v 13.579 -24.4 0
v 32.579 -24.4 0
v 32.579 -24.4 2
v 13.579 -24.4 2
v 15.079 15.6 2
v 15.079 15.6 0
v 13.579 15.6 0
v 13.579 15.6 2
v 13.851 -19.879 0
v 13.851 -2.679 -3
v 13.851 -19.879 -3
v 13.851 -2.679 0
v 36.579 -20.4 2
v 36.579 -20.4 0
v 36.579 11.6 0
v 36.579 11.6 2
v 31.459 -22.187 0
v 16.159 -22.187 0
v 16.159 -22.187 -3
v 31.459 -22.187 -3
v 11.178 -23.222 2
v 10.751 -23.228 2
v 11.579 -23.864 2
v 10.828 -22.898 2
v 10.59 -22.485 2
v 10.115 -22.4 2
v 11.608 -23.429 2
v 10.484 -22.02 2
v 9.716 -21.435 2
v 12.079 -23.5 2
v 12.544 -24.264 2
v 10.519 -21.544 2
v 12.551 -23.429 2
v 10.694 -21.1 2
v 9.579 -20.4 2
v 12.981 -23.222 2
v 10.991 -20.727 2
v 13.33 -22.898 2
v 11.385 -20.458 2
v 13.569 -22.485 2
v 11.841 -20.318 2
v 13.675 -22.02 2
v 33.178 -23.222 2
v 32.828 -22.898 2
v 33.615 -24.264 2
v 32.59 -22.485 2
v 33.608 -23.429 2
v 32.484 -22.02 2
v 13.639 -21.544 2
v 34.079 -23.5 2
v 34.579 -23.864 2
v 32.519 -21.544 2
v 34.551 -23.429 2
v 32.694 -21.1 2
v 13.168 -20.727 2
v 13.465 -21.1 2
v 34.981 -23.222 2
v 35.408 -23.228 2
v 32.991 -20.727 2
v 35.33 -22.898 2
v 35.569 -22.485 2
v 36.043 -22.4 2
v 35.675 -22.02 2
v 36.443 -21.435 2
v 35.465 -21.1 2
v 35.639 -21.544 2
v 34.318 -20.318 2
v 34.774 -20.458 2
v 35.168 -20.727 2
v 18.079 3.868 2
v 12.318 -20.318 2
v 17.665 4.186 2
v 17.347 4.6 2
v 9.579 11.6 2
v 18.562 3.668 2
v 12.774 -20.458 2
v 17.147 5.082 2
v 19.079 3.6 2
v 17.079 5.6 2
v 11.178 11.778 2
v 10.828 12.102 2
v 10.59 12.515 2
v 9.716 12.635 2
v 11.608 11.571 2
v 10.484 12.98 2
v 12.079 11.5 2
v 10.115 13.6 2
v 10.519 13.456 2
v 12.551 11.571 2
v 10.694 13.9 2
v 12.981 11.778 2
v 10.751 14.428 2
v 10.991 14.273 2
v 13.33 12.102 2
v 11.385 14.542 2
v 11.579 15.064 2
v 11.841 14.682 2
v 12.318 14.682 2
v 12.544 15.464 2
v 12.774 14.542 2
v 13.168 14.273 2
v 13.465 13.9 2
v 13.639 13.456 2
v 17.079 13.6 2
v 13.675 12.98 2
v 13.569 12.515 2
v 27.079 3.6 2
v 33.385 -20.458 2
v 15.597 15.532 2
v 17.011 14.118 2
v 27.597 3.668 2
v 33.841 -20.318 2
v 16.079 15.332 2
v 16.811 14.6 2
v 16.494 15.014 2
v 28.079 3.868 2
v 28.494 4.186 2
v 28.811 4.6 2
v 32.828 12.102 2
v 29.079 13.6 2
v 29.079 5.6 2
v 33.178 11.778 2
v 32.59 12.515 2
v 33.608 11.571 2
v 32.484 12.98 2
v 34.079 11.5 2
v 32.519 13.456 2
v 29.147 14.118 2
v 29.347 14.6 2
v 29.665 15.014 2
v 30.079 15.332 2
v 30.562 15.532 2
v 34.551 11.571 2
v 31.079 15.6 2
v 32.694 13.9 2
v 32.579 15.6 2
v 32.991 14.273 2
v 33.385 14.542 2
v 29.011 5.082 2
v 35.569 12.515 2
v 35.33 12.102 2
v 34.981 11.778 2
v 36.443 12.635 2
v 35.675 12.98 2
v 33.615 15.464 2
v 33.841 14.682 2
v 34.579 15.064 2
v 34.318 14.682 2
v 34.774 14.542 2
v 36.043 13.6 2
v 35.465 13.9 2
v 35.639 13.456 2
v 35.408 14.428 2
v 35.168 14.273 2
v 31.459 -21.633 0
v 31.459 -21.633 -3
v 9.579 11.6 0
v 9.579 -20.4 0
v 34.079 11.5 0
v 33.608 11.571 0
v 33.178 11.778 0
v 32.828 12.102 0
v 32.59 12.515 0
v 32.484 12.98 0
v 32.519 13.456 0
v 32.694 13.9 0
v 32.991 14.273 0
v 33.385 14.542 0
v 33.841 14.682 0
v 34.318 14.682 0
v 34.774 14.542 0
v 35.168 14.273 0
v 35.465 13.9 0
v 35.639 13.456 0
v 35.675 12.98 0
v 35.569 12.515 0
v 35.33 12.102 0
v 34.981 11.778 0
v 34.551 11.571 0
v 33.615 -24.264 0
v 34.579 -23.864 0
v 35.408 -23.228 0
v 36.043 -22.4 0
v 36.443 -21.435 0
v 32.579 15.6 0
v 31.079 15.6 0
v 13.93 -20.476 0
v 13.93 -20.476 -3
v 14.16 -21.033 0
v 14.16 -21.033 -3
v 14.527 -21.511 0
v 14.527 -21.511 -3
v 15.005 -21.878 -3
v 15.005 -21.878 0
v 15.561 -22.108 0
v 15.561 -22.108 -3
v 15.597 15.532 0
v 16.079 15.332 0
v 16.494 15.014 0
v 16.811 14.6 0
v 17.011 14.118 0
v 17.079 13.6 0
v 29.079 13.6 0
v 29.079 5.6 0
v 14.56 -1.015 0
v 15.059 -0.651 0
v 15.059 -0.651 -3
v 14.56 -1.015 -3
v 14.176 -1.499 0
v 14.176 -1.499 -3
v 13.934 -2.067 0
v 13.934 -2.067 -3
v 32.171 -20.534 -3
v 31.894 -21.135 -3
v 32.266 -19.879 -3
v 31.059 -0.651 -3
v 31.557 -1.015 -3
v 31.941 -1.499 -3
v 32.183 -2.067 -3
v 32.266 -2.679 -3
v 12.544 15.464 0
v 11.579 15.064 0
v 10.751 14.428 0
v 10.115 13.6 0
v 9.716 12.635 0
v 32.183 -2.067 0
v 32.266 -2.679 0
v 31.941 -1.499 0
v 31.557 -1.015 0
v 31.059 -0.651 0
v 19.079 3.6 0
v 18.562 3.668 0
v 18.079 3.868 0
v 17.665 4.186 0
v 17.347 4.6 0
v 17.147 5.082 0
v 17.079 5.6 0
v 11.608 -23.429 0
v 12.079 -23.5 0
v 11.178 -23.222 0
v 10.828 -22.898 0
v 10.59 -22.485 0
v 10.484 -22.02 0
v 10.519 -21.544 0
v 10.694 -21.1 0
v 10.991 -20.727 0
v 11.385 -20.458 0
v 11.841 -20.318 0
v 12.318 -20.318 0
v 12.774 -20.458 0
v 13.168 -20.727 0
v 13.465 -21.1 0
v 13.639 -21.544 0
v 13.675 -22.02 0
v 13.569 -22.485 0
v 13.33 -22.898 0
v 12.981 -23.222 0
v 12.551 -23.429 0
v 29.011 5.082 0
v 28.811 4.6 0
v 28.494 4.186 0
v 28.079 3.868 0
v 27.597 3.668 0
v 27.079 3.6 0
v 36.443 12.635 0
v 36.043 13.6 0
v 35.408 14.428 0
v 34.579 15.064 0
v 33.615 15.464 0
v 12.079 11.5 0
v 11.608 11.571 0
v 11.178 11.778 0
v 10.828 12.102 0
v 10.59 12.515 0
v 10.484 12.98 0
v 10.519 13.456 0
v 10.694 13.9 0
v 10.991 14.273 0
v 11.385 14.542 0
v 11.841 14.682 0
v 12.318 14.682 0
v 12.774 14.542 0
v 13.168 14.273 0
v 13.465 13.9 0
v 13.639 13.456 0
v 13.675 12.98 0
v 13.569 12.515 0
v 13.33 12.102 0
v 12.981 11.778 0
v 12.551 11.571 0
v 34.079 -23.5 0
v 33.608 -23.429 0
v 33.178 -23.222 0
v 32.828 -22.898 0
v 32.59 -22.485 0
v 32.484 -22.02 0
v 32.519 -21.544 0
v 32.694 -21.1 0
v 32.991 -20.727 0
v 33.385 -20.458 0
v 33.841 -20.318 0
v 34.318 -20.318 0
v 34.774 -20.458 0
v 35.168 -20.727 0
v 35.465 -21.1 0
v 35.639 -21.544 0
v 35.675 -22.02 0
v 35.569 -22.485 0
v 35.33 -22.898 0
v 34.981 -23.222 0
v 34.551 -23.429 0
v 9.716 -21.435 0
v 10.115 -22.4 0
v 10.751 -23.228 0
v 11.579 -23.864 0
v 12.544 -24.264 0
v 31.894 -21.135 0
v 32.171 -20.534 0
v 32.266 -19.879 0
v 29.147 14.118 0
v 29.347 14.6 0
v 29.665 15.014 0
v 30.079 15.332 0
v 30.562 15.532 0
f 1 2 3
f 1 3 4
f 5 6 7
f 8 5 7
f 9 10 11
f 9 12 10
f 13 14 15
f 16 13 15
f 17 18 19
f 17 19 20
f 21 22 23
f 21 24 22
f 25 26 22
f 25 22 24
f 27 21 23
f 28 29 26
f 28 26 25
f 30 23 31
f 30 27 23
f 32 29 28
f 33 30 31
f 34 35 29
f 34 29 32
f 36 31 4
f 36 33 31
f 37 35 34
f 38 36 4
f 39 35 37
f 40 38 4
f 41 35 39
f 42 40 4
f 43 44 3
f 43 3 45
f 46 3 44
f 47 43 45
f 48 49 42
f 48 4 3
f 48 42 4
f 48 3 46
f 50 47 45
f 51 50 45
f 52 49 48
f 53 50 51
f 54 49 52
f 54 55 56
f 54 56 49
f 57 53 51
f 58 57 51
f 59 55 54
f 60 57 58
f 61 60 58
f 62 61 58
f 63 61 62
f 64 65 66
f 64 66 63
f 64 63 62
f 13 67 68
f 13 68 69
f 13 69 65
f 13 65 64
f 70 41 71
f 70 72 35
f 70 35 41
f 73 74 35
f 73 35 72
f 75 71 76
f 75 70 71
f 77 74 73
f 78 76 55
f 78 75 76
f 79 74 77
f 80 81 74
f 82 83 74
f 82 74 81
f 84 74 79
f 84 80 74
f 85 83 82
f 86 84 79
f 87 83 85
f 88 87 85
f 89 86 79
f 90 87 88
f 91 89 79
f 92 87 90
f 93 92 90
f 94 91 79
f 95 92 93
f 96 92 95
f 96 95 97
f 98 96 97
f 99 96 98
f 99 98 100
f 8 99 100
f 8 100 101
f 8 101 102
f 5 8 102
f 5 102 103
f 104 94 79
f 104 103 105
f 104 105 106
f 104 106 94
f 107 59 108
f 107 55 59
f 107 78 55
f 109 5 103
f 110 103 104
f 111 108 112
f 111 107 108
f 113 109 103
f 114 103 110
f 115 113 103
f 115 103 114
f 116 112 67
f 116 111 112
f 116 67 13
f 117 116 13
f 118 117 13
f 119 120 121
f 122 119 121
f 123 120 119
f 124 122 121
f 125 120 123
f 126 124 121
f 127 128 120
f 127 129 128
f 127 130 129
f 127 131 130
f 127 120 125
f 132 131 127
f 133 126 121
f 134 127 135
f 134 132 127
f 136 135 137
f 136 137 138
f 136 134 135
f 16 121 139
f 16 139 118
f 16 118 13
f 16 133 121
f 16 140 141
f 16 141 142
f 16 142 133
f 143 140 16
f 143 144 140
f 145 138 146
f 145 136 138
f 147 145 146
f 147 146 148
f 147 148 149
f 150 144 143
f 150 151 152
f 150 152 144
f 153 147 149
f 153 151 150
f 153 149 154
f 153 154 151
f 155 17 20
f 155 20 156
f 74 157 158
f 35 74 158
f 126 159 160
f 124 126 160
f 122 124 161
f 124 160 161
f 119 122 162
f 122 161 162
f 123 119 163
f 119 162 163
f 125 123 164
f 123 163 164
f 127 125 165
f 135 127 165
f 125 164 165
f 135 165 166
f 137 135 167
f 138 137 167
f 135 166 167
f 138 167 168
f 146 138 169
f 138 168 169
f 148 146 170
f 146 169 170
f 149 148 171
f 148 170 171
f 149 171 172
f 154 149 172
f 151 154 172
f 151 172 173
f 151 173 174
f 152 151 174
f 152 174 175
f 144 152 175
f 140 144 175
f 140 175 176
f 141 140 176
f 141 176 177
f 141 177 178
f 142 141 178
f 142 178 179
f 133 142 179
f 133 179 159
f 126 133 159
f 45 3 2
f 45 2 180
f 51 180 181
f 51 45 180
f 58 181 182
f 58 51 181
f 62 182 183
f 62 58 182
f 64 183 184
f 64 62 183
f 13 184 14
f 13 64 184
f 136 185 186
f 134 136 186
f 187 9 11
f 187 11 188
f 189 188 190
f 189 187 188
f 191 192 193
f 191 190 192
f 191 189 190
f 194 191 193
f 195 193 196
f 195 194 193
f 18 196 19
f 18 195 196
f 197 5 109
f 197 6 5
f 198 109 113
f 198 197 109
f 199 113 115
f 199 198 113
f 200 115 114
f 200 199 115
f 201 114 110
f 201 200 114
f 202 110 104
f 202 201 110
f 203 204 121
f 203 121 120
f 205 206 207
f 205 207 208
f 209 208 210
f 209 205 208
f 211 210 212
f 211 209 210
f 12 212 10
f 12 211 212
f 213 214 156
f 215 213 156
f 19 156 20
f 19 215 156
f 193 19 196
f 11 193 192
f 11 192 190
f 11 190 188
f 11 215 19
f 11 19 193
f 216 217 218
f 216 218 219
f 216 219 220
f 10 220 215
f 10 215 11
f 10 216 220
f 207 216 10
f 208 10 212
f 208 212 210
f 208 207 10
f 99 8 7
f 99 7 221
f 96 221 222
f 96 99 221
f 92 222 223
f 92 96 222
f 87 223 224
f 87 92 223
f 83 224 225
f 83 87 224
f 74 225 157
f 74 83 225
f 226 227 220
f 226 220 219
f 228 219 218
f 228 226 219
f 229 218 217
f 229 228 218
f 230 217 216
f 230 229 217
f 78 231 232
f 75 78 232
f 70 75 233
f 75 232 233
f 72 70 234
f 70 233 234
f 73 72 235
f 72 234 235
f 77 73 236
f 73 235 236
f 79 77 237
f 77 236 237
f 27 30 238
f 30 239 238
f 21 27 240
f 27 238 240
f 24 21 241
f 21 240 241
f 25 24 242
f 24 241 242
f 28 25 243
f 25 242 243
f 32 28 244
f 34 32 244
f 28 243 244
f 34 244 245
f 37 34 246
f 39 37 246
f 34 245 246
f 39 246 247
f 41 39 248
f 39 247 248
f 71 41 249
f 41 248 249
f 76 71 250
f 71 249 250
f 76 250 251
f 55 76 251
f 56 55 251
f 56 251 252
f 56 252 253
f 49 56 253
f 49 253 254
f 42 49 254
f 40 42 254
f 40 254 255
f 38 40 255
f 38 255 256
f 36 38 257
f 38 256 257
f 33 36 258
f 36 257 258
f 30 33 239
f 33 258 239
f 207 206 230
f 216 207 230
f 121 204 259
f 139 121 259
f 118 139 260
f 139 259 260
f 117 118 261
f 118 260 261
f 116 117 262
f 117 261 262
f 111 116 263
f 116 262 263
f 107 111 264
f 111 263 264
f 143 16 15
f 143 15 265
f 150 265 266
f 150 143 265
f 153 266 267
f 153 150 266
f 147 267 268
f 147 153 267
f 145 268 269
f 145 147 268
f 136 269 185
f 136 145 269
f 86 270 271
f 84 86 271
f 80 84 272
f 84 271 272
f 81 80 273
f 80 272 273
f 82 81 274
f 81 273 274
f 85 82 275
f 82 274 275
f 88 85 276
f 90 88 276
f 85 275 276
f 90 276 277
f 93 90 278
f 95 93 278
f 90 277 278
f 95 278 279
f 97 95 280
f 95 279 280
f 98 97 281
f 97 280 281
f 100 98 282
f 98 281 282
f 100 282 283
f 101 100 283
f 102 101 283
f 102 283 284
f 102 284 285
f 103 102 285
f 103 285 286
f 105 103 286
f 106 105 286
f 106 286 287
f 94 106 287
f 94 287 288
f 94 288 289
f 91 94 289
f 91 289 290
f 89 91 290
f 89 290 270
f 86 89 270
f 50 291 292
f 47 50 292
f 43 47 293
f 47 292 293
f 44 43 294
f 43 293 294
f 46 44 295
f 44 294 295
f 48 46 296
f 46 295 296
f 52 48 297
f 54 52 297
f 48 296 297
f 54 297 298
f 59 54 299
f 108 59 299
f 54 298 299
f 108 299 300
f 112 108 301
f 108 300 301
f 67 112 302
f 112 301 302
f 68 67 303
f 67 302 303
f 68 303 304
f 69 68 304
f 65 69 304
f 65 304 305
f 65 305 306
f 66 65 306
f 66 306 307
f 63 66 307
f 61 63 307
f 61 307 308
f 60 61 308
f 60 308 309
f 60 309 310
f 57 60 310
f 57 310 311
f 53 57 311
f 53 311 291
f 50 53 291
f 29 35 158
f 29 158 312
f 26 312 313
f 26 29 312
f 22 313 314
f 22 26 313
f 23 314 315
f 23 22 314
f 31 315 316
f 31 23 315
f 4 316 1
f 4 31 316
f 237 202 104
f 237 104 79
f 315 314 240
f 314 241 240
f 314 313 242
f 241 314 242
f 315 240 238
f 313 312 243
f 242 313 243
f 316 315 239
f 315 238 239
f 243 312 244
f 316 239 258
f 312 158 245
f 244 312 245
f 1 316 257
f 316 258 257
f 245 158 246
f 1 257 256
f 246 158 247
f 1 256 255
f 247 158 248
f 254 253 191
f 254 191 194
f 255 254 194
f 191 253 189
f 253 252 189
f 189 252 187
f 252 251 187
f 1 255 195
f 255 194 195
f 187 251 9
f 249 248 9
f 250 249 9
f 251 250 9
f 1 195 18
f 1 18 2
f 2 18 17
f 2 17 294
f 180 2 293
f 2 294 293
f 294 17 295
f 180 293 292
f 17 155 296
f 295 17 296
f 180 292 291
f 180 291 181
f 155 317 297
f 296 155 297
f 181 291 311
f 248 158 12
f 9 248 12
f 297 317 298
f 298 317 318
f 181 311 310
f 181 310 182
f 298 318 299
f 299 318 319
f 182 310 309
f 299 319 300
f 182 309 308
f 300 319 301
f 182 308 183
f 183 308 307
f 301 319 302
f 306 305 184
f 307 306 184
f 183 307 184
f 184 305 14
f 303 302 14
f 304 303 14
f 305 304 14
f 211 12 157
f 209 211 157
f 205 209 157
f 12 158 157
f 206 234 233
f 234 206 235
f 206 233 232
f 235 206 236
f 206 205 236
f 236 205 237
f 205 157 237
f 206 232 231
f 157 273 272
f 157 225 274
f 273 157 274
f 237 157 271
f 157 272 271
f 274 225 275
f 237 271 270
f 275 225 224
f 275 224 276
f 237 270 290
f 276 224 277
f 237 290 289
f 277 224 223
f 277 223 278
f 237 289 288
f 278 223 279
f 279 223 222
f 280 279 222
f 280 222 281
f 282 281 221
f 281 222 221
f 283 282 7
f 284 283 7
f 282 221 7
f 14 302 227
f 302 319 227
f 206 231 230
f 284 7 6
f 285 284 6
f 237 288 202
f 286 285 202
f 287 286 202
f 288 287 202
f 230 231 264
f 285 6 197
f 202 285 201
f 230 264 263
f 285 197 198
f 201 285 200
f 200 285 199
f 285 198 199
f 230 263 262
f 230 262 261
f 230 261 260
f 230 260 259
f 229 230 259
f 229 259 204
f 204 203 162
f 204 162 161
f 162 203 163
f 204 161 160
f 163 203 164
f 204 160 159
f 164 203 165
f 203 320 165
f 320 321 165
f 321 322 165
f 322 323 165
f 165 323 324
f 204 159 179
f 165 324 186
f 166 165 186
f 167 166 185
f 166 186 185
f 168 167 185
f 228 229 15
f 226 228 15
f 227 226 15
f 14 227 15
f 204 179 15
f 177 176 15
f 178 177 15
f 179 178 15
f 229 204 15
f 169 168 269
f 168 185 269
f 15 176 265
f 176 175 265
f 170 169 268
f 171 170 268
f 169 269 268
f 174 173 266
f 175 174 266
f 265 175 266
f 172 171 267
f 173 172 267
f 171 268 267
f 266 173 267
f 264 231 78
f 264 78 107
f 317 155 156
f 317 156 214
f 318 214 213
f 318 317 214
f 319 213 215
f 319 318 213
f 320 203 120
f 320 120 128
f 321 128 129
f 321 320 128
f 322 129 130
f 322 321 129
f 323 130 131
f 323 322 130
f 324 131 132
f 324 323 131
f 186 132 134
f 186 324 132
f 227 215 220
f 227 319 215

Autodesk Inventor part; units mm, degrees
ref_plane "YZ Plane" through (0, 0, 0) normal (1, 0, 0) x (0, 1, 0)
ref_plane "XZ Plane" through (0, 0, 0) normal (0, 1, 0) x (-1, 0, 0)
ref_plane "XY Plane" through (0, 0, 0) normal (0, 0, 1) x (1, 0, 0)
ref_plane "Arbeitsebene1" through (0, 0, 0) normal (0, 0, 1) x (1, 0, 0)
sketch "Skizze1" plane through (0, 0, 0) normal (0, 0, 1) x (1, 0, 0)
  line L0 (31.9586, -24.4) -> (31.9586, -21.8494) projected
  line L1 (31.9586, -24.4) -> (35.5793, -24.4) projected
  arc A0 (35.5793, -24.4) -> (36.5793, -23.4) centre (35.5793, -23.4) ccw projected
  line L2 (36.5793, -23.4) -> (36.5793, 14.6) projected
  arc A1 (36.5793, 14.6) -> (35.5793, 15.6) centre (35.5793, 14.6) ccw projected
  line L3 (35.5793, 15.6) -> (31.5586, 15.6) projected
  line L4 (31.5586, 15.6) -> (31.5586, -0.3724) projected
  arc A2 (32.766, -2.6793) -> (31.5586, -0.3724) centre (29.9586, -2.6793) ccw projected
  line L5 (32.766, -2.6793) -> (32.766, -19.8793) projected
  arc A3 (31.9586, -21.8494) -> (32.766, -19.8793) centre (29.9586, -19.8793) ccw projected
  line L6 (20.9586, -22.6867) -> (20.9586, -24.4) projected
  line L7 (20.9586, -22.6867) -> (16.1586, -22.6867) projected
  arc A4 (13.3512, -19.8793) -> (16.1586, -22.6867) centre (16.1586, -19.8793) ccw projected
  line L8 (13.3512, -19.8793) -> (13.3512, -2.6793) projected
  arc A5 (14.5586, -0.3724) -> (13.3512, -2.6793) centre (16.1586, -2.6793) ccw projected
  line L9 (14.5586, -0.3724) -> (14.5586, 15.6) projected
  line L10 (14.5586, 15.6) -> (10.5793, 15.6) projected
  arc A6 (10.5793, 15.6) -> (9.5793, 14.6) centre (10.5793, 14.6) ccw projected
  line L11 (9.5793, 14.6) -> (9.5793, -23.4) projected
  arc A7 (9.5793, -23.4) -> (10.5793, -24.4) centre (10.5793, -23.4) ccw projected
  line L12 (10.5793, -24.4) -> (20.9586, -24.4) projected
  circle A8 centre (12.0668, 4.4966) radius 1.4 projected
  line L13 (31.5586, 15.6) -> (14.5586, 15.6)
  line L14 (31.9586, -24.4) -> (20.9586, -24.4)
  line L15 (10.5793, 15.6) -> (9.5793, 15.6)
  line L16 (9.5793, 15.6) -> (9.5793, 14.6)
  line L17 (35.5793, 15.6) -> (36.5793, 15.6)
  line L18 (36.5793, 15.6) -> (36.5793, 14.6)
  line L19 (9.5793, -23.4) -> (9.5793, -24.4)
  line L20 (9.5793, -24.4) -> (10.5793, -24.4)
  line L21 (35.5793, -24.4) -> (36.5793, -24.4)
  line L22 (36.5793, -24.4) -> (36.5793, -23.4)
extrude "Extrusion1" add sketch "Skizze1" along normal blind 2 contours L14 L6 L7 A4 L8 A5 L9 L13 L4 A2 L5 A3 L0 | L0 A3 L5 A2 L4 L3 A1 L2 A0 L1 | A0 L22 L21 | L12 A7 L11 A6 L10 L9 A5 L8 A4 L7 L6 | L20 L19 A7 | A1 L17 L18 | L16 L15 A6 | A8
ref_plane "Arbeitsebene2" through (0, 0, 0) normal (0, 0, 1) x (1, 0, 0)
sketch "Skizze2" plane through (0, 0, 2) normal (0, 0, 1) x (1, 0, 0)
  arc A0 (35.5793, -24.4) -> (36.5793, -23.4) centre (35.5793, -23.4) ccw projected
  line L0 (36.5793, -23.4) -> (36.5793, 14.6) projected
  arc A1 (36.5793, 14.6) -> (35.5793, 15.6) centre (35.5793, 14.6) ccw projected
  line L1 (35.5793, 15.6) -> (10.5793, 15.6) projected
  arc A2 (10.5793, 15.6) -> (9.5793, 14.6) centre (10.5793, 14.6) ccw projected
  line L2 (9.5793, 14.6) -> (9.5793, -23.4) projected
  arc A3 (9.5793, -23.4) -> (10.5793, -24.4) centre (10.5793, -23.4) ccw projected
  line L3 (10.5793, -24.4) -> (35.5793, -24.4) projected
  line L4 (34.0793, 13.1) -> (34.0793, -21.9)
  line L5 (34.0793, -21.9) -> (12.0793, -21.9)
  line L6 (12.0793, -21.9) -> (12.0793, 13.1)
  line L7 (12.0793, 13.1) -> (34.0793, 13.1)
  point P0 (8.0712, 15)
  point P1 (8.0712, -15)
  point P2 (38.0712, 15)
  point P3 (38.0712, -15)
  dimension "d21" = 2.5
hole "Bohrung1" at (34.0793, 13.1, 2) at (34.0793, -21.9, 2) at (12.0793, -21.9, 2) at (12.0793, 13.1, 2) direction (0, 0, -1) diameter 3.2 end through all
sketch "Skizze4" plane through (0, 0, 0) normal (0, 0, -1) x (-1, 0, 0)
  circle A0 centre (-34.0793, 13.1) radius 1.4 projected
  circle A1 centre (-34.0793, -21.9) radius 1.4 projected
  line L0 (-31.9586, -24.4) -> (-31.9586, -21.8494) projected
  line L1 (-31.9586, -24.4) -> (-35.5793, -24.4) projected
  arc A2 (-36.5793, -23.4) -> (-35.5793, -24.4) centre (-35.5793, -23.4) ccw projected
  line L2 (-36.5793, -23.4) -> (-36.5793, 14.6) projected
  arc A3 (-35.5793, 15.6) -> (-36.5793, 14.6) centre (-35.5793, 14.6) ccw projected
  line L3 (-35.5793, 15.6) -> (-31.5586, 15.6) projected
  line L4 (-31.5586, 15.6) -> (-31.5586, -0.3724) projected
  arc A4 (-31.5586, -0.3724) -> (-32.766, -2.6793) centre (-29.9586, -2.6793) ccw projected
  line L5 (-32.766, -2.6793) -> (-32.766, -19.8793) projected
  arc A5 (-32.766, -19.8793) -> (-31.9586, -21.8494) centre (-29.9586, -19.8793) ccw projected
  circle A6 centre (-12.0793, -21.9) radius 1.4 projected
  circle A7 centre (-12.0793, 13.1) radius 1.4 projected
  line L6 (-20.9586, -22.6867) -> (-20.9586, -24.4) projected
  line L7 (-20.9586, -22.6867) -> (-16.1586, -22.6867) projected
  arc A8 (-16.1586, -22.6867) -> (-13.3512, -19.8793) centre (-16.1586, -19.8793) ccw projected
  line L8 (-13.3512, -19.8793) -> (-13.3512, -2.6793) projected
  arc A9 (-13.3512, -2.6793) -> (-14.5586, -0.3724) centre (-16.1586, -2.6793) ccw projected
  line L9 (-14.5586, -0.3724) -> (-14.5586, 15.6) projected
  line L10 (-14.5586, 15.6) -> (-10.5793, 15.6) projected
  arc A10 (-9.5793, 14.6) -> (-10.5793, 15.6) centre (-10.5793, 14.6) ccw projected
  line L11 (-9.5793, 14.6) -> (-9.5793, -23.4) projected
  arc A11 (-10.5793, -24.4) -> (-9.5793, -23.4) centre (-10.5793, -23.4) ccw projected
  line L12 (-10.5793, -24.4) -> (-20.9586, -24.4) projected
  circle A12 centre (-12.0668, 4.4966) radius 1.4 projected
  line L13 (-31.0586, -0.651) -> (-31.0586, 16.1)
  line L14 (-31.0586, 16.1) -> (-35.5793, 16.1)
  arc A13 (-35.5793, 16.1) -> (-37.0793, 14.6) centre (-35.5793, 14.6) ccw
  line L15 (-37.0793, 14.6) -> (-37.0793, -23.4)
  arc A14 (-37.0793, -23.4) -> (-35.5793, -24.9) centre (-35.5793, -23.4) ccw
  line L16 (-35.5793, -24.9) -> (-31.4586, -24.9)
  line L17 (-31.4586, -24.9) -> (-31.4586, -21.6326)
  arc A15 (-32.266, -19.8793) -> (-31.4586, -21.6326) centre (-29.9586, -19.8793) ccw
  line L18 (-32.266, -19.8793) -> (-32.266, -2.6793)
  arc A16 (-31.0586, -0.651) -> (-32.266, -2.6793) centre (-29.9586, -2.6793) ccw
  line L19 (-15.0586, 16.1) -> (-15.0586, -0.651)
  arc A17 (-13.8512, -2.6793) -> (-15.0586, -0.651) centre (-16.1586, -2.6793) ccw
  line L20 (-13.8512, -2.6793) -> (-13.8512, -19.8793)
  arc A18 (-16.1586, -22.1867) -> (-13.8512, -19.8793) centre (-16.1586, -19.8793) ccw
  line L21 (-16.1586, -22.1867) -> (-21.4586, -22.1867)
  line L22 (-21.4586, -24.4607) -> (-21.4586, -24.9)
  line L23 (-21.4586, -24.9) -> (-10.5793, -24.9)
  arc A19 (-10.5793, -24.9) -> (-9.0793, -23.4) centre (-10.5793, -23.4) ccw
  line L24 (-9.0793, -23.4) -> (-9.0793, 14.6)
  arc A20 (-9.0793, 14.6) -> (-10.5793, 16.1) centre (-10.5793, 14.6) ccw
  line L25 (-10.5793, 16.1) -> (-15.0586, 16.1)
  line L26 (-31.0586, 15.6607) -> (-15.0586, 15.6607)
  line L27 (-31.4586, -24.4607) -> (-21.4586, -24.4607)
  line L28 (-15.0586, -0.651) -> (-31.0586, -0.651)
  line L29 (-20.9586, -22.6867) -> (-20.9586, -22.1867)
  line L30 (-20.9586, -22.1867) -> (-31.9586, -22.1867)
  point P0 (0, 0)
  point P1 (-31.4586, -22.1867)
  dimension "d22" = 0.5
  dimension "d23" = 0.5
extrude "Extrusion2" add sketch "Skizze4" along normal blind 3 contours L17 A15 L18 A16 L28 A17 L20 A18 L21 L30
fillet "Rundung2" radius 4 4 edges at (9.5793, 15.6, 1) (36.5793, 15.6, 1) (9.5793, -24.4, 1) (36.5793, -24.4, 1)
sketch "Skizze5" plane through (0, 0, 0) normal (0, 0, -1) x (-1, 0, 0)
  circle A0 centre (-23.0793, -4.4) radius 4.25 projected
  circle A1 centre (-12.0668, 4.4966) radius 1.4 projected
  circle A2 centre (-34.0668, 4.4966) radius 1.4 projected
  circle A3 centre (-12.0793, 13.1) radius 1.4 projected
  circle A4 centre (-34.0793, -21.9) radius 1.4 projected
  circle A5 centre (-34.0793, 13.1) radius 1.4 projected
  circle A6 centre (-12.0793, -21.9) radius 1.4 projected
  arc A7 (-29.0793, 13.6) -> (-31.0793, 15.6) centre (-31.0793, 13.6) ccw projected
  line L0 (-32.5793, 15.6) -> (-31.0793, 15.6) projected
  arc A8 (-32.5793, 15.6) -> (-36.5793, 11.6) centre (-32.5793, 11.6) ccw projected
  line L1 (-36.5793, -20.4) -> (-36.5793, 11.6) projected
  arc A9 (-36.5793, -20.4) -> (-32.5793, -24.4) centre (-32.5793, -20.4) ccw projected
  line L2 (-13.5793, -24.4) -> (-32.5793, -24.4) projected
  arc A10 (-13.5793, -24.4) -> (-9.5793, -20.4) centre (-13.5793, -20.4) ccw projected
  line L3 (-9.5793, 11.6) -> (-9.5793, -20.4) projected
  arc A11 (-9.5793, 11.6) -> (-13.5793, 15.6) centre (-13.5793, 11.6) ccw projected
  line L4 (-15.0793, 15.6) -> (-13.5793, 15.6) projected
  arc A12 (-15.0793, 15.6) -> (-17.0793, 13.6) centre (-15.0793, 13.6) ccw projected
  line L5 (-17.0793, 13.6) -> (-17.0793, 5.6) projected
  arc A13 (-19.0793, 3.6) -> (-17.0793, 5.6) centre (-19.0793, 5.6) ccw projected
  line L6 (-19.0793, 3.6) -> (-27.0793, 3.6) projected
  arc A14 (-29.0793, 5.6) -> (-27.0793, 3.6) centre (-27.0793, 5.6) ccw projected
  line L7 (-29.0793, 5.6) -> (-29.0793, 13.6) projected
  line L8 (-32.5793, 15.6) -> (-13.5793, 15.6) projected
  point P0 (0, 0)
extrude "Extrusion3" cut sketch "Skizze5" against normal blind 10 contours A7 L8 A12 L5 A13 L6 A14 L7
properties part number "00_ESP32_XIAO_Adapter_lid"
